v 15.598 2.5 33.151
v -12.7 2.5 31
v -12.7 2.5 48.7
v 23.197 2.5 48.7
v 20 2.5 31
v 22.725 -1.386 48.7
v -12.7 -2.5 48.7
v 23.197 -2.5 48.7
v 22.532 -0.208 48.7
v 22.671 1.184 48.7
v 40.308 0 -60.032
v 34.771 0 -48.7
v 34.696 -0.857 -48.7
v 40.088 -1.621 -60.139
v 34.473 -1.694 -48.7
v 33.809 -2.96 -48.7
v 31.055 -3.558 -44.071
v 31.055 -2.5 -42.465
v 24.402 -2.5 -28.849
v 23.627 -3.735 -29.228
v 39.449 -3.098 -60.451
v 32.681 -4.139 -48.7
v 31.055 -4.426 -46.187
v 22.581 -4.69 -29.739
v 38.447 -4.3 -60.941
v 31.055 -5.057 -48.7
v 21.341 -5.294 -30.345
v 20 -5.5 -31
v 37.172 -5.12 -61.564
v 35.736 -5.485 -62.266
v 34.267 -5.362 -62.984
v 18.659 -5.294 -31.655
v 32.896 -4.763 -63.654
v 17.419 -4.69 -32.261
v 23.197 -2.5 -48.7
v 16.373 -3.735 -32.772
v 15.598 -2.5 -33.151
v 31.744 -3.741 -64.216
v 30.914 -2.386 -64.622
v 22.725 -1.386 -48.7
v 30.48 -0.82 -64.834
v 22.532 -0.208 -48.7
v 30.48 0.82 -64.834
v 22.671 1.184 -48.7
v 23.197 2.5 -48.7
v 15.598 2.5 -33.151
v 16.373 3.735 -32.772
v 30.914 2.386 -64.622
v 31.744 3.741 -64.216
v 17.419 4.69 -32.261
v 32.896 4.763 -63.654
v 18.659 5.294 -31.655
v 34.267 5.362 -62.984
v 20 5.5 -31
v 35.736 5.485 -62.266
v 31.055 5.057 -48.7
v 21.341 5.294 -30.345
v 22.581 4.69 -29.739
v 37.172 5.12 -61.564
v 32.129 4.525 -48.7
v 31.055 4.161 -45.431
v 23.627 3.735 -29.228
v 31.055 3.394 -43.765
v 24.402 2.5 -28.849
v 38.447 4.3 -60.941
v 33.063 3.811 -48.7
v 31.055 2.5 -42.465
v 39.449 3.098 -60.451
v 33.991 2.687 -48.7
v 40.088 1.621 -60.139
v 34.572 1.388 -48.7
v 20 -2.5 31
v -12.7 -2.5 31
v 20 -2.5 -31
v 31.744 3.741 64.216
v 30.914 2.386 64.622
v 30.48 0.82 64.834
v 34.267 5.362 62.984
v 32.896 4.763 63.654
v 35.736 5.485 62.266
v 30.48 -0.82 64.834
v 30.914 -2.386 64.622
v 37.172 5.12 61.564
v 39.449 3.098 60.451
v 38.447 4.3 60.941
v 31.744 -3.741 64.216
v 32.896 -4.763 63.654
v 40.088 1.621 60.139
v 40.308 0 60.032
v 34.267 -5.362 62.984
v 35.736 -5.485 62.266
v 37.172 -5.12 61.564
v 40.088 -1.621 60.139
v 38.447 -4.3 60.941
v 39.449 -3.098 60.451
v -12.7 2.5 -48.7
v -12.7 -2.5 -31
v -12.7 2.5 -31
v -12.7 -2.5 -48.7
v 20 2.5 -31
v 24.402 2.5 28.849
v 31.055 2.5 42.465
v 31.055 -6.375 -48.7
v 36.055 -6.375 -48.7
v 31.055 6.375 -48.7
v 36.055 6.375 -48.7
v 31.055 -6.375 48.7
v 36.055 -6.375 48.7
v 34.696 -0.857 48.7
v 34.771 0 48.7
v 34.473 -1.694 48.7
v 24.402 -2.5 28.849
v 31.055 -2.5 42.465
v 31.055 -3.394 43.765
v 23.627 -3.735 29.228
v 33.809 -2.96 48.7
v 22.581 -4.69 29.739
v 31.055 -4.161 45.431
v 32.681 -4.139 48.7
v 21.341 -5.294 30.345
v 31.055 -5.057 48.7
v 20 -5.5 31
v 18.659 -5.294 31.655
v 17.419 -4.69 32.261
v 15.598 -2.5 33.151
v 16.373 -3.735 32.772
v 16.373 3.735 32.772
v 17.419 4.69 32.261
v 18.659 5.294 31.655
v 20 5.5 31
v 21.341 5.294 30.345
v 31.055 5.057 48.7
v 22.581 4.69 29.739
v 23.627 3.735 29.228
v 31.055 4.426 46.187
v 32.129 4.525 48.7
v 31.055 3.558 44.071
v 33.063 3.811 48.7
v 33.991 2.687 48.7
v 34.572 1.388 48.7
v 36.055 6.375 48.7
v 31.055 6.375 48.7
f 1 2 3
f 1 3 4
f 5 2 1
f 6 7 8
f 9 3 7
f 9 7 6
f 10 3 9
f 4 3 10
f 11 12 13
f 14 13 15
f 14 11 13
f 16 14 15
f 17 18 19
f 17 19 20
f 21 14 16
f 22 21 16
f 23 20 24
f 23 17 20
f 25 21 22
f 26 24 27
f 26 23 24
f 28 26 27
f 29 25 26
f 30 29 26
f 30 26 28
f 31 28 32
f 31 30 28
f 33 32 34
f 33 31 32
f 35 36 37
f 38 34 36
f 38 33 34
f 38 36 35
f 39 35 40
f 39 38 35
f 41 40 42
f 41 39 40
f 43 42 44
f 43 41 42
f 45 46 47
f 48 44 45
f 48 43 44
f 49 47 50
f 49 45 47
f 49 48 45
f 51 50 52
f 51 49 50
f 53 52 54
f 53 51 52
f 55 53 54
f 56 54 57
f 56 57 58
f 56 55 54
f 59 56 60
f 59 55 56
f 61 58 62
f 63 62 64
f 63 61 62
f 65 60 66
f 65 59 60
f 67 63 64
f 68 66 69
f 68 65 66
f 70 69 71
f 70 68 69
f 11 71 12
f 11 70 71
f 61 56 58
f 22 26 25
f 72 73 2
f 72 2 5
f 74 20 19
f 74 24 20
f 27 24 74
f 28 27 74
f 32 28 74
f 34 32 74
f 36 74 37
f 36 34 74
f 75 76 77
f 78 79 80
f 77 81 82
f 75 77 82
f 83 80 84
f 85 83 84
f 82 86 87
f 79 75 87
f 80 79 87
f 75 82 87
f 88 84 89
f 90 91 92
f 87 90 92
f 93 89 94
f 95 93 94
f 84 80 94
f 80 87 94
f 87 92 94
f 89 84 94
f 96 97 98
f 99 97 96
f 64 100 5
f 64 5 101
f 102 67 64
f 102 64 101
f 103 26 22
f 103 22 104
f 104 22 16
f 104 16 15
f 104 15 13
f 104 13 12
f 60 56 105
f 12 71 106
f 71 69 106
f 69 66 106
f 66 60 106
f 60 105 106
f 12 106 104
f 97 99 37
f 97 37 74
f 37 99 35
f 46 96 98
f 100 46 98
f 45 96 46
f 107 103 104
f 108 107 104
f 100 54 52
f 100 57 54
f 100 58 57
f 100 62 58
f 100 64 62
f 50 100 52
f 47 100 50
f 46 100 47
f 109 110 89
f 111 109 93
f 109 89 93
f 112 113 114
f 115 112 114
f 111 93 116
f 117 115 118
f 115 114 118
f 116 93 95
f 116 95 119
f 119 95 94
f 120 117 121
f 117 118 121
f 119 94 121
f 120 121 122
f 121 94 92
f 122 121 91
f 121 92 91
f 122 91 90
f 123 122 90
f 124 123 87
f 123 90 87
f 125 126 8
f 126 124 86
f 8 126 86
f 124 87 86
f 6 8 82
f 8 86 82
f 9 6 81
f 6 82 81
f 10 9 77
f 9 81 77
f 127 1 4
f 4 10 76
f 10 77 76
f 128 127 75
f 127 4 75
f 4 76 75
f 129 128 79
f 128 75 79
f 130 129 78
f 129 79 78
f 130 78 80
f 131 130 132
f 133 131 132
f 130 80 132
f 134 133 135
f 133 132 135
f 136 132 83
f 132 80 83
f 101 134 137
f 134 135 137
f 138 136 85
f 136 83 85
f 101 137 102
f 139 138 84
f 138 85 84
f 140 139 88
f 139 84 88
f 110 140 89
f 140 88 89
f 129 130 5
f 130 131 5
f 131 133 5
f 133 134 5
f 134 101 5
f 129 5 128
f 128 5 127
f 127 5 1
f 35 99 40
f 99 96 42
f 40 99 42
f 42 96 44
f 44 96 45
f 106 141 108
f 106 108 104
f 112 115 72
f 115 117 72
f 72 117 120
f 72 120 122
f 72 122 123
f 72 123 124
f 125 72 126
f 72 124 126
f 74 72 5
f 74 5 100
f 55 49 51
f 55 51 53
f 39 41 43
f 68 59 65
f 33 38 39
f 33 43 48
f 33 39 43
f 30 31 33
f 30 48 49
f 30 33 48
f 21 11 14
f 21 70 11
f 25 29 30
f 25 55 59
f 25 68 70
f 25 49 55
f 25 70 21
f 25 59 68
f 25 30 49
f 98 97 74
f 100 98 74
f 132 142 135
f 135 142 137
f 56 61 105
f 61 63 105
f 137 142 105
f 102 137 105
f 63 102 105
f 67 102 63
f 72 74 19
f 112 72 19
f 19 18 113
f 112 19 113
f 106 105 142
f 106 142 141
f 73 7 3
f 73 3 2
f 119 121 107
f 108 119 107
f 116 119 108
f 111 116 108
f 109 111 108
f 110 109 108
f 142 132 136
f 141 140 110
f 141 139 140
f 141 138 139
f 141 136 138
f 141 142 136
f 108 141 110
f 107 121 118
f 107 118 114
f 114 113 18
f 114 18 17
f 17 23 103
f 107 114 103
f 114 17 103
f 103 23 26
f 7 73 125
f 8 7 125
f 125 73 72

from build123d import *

# Parameters (mm, degrees)
SKETCH1_W               = 72.11
SKETCH1_H               = 97.4
BOSS_EXTRUDE1_DEPTH     = 2.5
SKETCH2_W               = 5
SKETCH2_H               = 97.4
BOSS_EXTRUDE2_DEPTH     = 6.375
CUT_EXTRUDE1_DEPTH      = 62.240661737
CUT_EXTRUDE1_DEPTH_BACK = 62.240661737
SKETCH3_W               = 40
SKETCH3_H               = 62
CUT_EXTRUDE2_DEPTH      = 77.631155751
CUT_EXTRUDE2_DEPTH_BACK = 77.631155751
SKETCH5_W               = 31.75
SKETCH5_H               = 152.4


with BuildPart() as part:
    # Sketch1 → Boss-Extrude1 (new, symmetric)
    with BuildSketch(Plane(origin=(0, 0, 0), x_dir=(1, 0, 0), z_dir=(0, 1, 0))):
        Rectangle(SKETCH1_W, SKETCH1_H)
    extrude(amount=BOSS_EXTRUDE1_DEPTH, both=True)

    # Sketch2 → Boss-Extrude2 (add, symmetric)
    with BuildSketch(Plane(origin=(0, 0, 0), x_dir=(1, 0, 0), z_dir=(0, 1, 0))):
        with Locations((-33.555, 0)):
            Rectangle(SKETCH2_W, SKETCH2_H)
        with Locations((33.555, 0)):
            Rectangle(SKETCH2_W, SKETCH2_H)
    extrude(amount=BOSS_EXTRUDE2_DEPTH, both=True)

    # Sketch3 → Cut-Extrude1 (cut, two sides: drawn at the far end of the back side and taken through both)
    with BuildSketch(Plane(origin=(0, 2.5, 0), x_dir=(1, 0, 0), z_dir=(0, 1, 0)).offset(-CUT_EXTRUDE1_DEPTH_BACK)):
        Rectangle(SKETCH3_W, SKETCH3_H)
    extrude(amount=CUT_EXTRUDE1_DEPTH + CUT_EXTRUDE1_DEPTH_BACK, mode=Mode.SUBTRACT)

    # Sketch4 → Revolve1 (revolve)
    with BuildSketch(Plane(origin=(0, 0, 0), x_dir=(1, 0, 0), z_dir=(0, 1, 0)), mode=Mode.PRIVATE) as revolve1_sk:
        Polygon((20, 31), (15.058430503, 33.414723774), (30.424854519, 64.86107512), (35.366424016, 62.446351346), align=None)
    revolve1 = revolve(revolve1_sk.sketch.rotate(Axis((20, 0, -31), (0.4390406861851917, 0, -0.8984671813004836)), 180), axis=Axis((20, 0, -31), (0.4390406861851917, 0, -0.8984671813004836)))

    # Mirror1: Revolve1 across plane
    add(revolve1.mirror(Plane.XY))

    # Sketch5 → Cut-Extrude2 (cut, two sides: drawn at the far end of the back side and taken through both)
    with BuildSketch(Plane(origin=(0, 0, 0), x_dir=(1, 0, 0), z_dir=(0, 1, 0)).offset(-CUT_EXTRUDE2_DEPTH_BACK)):
        with Locations((-28.575, 0)):
            Rectangle(SKETCH5_W, SKETCH5_H)
    extrude(amount=CUT_EXTRUDE2_DEPTH + CUT_EXTRUDE2_DEPTH_BACK, mode=Mode.SUBTRACT)


solid = part.part
